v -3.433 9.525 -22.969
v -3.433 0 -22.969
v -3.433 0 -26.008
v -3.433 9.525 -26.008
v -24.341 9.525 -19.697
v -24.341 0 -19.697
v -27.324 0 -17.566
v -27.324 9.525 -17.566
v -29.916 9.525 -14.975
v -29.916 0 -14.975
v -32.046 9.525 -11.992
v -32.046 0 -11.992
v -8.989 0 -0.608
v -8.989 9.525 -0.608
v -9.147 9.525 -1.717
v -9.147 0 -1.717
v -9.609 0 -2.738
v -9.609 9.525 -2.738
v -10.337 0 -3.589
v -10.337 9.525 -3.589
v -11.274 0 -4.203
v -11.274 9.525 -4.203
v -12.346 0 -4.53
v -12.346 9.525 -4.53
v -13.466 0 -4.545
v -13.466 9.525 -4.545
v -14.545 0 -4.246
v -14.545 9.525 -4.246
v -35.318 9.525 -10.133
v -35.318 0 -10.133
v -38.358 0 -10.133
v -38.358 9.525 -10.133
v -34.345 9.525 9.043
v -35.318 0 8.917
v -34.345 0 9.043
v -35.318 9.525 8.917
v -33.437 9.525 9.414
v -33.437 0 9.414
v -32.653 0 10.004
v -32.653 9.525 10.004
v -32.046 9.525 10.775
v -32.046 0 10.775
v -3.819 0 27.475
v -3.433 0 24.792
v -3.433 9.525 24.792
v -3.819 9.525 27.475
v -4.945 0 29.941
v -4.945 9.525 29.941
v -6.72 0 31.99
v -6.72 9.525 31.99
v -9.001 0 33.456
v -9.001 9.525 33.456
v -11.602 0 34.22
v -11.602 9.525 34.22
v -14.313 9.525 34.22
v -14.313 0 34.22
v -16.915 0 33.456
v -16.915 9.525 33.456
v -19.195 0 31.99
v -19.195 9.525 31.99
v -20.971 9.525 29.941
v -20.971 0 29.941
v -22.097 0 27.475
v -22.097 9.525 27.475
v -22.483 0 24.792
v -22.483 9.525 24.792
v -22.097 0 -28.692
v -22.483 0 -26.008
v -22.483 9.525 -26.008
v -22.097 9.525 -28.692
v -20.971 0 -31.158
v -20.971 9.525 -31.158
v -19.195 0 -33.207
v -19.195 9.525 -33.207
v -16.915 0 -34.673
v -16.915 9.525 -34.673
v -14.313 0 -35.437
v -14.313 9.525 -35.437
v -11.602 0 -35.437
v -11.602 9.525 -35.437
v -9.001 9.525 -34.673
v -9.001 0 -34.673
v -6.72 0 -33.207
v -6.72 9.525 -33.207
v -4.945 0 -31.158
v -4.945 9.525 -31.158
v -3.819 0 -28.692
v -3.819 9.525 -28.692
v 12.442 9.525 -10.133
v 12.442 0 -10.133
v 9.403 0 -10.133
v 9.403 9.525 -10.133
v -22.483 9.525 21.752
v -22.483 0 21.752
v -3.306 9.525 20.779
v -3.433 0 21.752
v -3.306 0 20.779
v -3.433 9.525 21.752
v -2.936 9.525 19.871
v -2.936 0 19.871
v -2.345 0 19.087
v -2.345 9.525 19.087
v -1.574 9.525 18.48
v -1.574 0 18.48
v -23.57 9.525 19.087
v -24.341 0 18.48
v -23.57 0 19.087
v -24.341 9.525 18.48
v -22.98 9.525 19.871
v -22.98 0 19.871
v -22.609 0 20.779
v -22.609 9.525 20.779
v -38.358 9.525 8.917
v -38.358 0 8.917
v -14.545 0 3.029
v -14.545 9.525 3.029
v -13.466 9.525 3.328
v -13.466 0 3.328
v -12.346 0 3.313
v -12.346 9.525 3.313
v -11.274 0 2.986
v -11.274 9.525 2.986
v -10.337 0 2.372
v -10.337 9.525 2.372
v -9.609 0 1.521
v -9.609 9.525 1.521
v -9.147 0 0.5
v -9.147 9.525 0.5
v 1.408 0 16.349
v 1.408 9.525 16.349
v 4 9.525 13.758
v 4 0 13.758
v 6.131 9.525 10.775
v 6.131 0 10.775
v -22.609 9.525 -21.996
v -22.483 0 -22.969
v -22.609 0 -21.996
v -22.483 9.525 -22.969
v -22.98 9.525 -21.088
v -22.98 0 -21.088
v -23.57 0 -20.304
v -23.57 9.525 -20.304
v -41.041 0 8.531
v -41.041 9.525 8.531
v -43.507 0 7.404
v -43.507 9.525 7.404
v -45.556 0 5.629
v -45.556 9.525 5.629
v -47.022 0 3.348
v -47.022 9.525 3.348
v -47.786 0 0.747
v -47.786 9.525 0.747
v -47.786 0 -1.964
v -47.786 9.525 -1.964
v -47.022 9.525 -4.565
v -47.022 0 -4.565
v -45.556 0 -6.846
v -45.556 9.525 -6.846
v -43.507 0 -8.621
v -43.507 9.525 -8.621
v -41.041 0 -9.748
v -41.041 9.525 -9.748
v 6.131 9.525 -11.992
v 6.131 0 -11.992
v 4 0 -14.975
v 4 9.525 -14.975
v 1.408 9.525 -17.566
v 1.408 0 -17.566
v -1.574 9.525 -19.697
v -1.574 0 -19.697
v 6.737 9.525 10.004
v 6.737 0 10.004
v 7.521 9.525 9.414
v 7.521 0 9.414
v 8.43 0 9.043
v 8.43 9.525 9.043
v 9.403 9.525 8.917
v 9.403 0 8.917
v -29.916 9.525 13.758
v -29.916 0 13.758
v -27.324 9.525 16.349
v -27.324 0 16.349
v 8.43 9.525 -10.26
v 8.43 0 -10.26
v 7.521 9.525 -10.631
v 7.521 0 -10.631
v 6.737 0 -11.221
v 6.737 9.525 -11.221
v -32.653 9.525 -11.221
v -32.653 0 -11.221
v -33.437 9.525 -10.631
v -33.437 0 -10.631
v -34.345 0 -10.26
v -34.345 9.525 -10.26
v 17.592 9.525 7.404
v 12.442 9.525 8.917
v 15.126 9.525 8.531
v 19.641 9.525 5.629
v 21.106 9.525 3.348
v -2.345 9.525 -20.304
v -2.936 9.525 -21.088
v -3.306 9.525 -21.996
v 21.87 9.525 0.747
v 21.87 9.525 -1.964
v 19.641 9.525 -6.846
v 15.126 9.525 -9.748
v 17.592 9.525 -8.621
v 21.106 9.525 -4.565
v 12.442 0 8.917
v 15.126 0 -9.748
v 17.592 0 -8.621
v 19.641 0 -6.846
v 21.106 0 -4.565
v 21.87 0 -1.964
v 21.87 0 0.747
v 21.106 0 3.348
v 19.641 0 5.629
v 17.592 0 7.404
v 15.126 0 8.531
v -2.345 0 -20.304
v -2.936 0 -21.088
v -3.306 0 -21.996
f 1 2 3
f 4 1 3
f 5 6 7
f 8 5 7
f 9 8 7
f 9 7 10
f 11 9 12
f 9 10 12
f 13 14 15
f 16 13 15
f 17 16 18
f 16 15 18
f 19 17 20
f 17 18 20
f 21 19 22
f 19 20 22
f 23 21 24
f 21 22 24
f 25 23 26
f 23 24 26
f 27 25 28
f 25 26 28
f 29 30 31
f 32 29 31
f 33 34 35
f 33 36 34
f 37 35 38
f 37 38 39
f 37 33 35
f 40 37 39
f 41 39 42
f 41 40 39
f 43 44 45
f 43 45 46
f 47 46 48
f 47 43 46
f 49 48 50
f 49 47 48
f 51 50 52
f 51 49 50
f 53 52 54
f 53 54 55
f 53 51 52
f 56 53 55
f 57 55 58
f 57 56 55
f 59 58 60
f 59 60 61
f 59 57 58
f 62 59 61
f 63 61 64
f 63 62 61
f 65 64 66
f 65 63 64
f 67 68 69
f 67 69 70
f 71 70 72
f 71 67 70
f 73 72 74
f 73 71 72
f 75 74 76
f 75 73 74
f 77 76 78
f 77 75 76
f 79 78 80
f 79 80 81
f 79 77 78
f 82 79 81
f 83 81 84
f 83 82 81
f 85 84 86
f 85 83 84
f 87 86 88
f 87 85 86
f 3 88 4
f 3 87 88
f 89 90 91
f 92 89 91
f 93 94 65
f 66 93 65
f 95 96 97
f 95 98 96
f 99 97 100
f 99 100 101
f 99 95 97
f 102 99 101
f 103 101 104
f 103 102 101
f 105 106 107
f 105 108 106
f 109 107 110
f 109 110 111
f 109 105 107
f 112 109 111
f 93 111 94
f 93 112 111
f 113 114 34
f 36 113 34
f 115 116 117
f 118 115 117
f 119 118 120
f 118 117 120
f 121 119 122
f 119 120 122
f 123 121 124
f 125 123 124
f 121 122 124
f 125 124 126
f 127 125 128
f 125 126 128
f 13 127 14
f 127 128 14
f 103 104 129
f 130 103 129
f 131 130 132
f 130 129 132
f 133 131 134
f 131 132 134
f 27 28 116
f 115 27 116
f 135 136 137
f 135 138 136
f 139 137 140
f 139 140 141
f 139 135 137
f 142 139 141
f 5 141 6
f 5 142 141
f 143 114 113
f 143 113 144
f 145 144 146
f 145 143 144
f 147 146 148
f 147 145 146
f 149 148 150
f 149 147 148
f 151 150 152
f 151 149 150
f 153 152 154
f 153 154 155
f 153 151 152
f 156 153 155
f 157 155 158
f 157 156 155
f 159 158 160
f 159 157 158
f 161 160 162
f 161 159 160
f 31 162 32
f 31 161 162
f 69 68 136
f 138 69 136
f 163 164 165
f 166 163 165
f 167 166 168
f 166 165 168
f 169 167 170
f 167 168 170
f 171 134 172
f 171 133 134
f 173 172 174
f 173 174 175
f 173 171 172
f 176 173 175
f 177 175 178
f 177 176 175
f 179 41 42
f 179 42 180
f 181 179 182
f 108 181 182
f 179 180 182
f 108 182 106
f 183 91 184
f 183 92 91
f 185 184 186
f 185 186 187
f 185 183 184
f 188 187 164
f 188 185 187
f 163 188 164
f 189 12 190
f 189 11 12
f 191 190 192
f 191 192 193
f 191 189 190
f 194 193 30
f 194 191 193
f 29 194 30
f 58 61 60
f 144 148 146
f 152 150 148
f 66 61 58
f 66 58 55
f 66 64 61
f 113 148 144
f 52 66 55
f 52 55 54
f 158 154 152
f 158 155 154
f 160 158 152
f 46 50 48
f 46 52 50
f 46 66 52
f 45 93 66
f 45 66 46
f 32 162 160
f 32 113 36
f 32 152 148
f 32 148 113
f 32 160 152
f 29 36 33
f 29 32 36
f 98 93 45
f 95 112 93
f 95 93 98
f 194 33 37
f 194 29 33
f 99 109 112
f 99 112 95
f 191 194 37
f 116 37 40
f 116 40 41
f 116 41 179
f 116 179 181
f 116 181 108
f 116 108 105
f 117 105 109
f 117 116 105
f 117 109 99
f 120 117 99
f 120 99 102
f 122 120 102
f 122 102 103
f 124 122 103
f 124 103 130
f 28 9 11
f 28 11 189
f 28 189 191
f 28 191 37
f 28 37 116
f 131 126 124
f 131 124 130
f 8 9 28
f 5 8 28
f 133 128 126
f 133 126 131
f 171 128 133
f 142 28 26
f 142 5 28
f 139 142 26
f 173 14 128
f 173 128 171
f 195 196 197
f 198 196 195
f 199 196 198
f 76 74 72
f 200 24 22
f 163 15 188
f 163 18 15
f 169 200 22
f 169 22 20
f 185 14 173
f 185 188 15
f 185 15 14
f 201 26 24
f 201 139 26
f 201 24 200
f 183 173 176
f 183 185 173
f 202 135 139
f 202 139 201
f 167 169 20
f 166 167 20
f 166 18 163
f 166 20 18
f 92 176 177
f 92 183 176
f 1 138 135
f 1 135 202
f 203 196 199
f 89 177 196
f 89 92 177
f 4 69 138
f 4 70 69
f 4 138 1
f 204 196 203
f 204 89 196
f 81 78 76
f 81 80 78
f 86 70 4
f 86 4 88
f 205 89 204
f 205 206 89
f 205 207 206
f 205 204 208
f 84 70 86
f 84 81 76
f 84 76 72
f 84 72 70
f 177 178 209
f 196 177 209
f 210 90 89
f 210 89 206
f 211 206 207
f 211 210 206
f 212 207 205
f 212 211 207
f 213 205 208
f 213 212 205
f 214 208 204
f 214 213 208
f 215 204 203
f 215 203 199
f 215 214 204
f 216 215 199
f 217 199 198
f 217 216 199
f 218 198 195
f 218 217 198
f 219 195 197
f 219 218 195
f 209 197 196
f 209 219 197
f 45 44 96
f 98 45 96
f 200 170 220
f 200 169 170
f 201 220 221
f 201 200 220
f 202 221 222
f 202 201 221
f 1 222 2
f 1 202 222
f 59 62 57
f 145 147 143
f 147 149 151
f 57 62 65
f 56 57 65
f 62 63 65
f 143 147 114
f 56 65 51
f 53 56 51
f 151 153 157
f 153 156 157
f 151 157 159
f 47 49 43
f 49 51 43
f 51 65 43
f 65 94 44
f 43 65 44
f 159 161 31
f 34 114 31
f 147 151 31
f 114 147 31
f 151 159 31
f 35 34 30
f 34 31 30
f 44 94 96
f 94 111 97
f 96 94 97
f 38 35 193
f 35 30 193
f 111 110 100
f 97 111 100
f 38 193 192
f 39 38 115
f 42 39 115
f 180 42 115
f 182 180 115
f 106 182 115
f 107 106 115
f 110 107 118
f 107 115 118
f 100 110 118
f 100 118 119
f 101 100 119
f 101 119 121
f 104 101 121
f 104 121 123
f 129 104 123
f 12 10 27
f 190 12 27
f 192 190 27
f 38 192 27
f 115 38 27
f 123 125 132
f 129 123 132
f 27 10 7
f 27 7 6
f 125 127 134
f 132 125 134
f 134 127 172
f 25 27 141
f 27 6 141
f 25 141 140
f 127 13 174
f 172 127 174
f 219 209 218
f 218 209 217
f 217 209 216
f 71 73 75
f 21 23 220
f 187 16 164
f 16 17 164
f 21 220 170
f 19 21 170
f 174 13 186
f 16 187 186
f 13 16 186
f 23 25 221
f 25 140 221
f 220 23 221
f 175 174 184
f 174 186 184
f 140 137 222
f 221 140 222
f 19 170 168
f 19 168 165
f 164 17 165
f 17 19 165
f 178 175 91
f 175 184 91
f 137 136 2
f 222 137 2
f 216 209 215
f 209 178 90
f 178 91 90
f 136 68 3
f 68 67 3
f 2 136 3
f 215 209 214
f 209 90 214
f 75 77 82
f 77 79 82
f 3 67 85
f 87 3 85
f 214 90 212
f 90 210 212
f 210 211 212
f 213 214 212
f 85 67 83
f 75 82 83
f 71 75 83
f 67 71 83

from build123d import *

# Parameters (mm, degrees)
SKETCH1_W           = 19.05
SKETCH1_H           = 19.05
BOSS_EXTRUDE1_DEPTH = 9.525
FILLET1_R           = 3.81
CUT_EXTRUDE1_DEPTH  = 61.38309394


with BuildPart() as part:
    # Sketch1 → Boss-Extrude1 (new body)
    with BuildSketch(Plane(origin=(0, 0, 0), x_dir=(1, 0, 0), z_dir=(0, 1, 0))):
        with BuildLine():
            Line((-3.432814358, 26.008484179), (-22.482814358, 26.008484179))
            Line((-22.482814358, 26.008484179), (-22.482814358, 20.688947321))
            ThreePointArc((-22.482814358, 20.688947321), (-12.957814358, 22.833484179), (-3.432814358, 20.688947321))
            Line((-3.432814358, 20.688947321), (-3.432814358, 26.008484179))
        make_face()
        with BuildLine():
            ThreePointArc((-3.432814358, 20.688947321), (-12.957814358, 22.833484179), (-22.482814358, 20.688947321))
            Line((-22.482814358, 20.688947321), (-22.482814358, 10.133484179))
            Line((-22.482814358, 10.133484179), (-3.432814358, 10.133484179))
            Line((-3.432814358, 10.133484179), (-3.432814358, 20.688947321))
        make_face()
        with BuildLine():
            ThreePointArc((-22.482814358, 26.008484179), (-12.957814358, 35.533484179), (-3.432814358, 26.008484179))
            Line((-3.432814358, 26.008484179), (-22.482814358, 26.008484179))
        make_face()
        with Locations((-12.957814358, 0.608484179)):
            Rectangle(SKETCH1_W, SKETCH1_H)
        with BuildLine():
            Line((-22.482814358, -8.916515821), (-22.482814358, 10.133484179))
            Line((-22.482814358, 10.133484179), (-33.0382775, 10.133484179))
            ThreePointArc((-33.0382775, 10.133484179), (-35.182814358, 0.608484179), (-33.0382775, -8.916515821))
            Line((-33.0382775, -8.916515821), (-22.482814358, -8.916515821))
        make_face()
        with BuildLine():
            ThreePointArc((-33.0382775, -8.916515821), (-35.182814358, 0.608484179), (-33.0382775, 10.133484179))
            Line((-33.0382775, 10.133484179), (-38.357814358, 10.133484179))
            Line((-38.357814358, 10.133484179), (-38.357814358, -8.916515821))
            Line((-38.357814358, -8.916515821), (-33.0382775, -8.916515821))
        make_face()
        with BuildLine():
            Line((-38.357814358, 10.133484179), (-38.357814358, -8.916515821))
            ThreePointArc((-38.357814358, -8.916515821), (-47.882814358, 0.608484179), (-38.357814358, 10.133484179))
        make_face()
        with BuildLine():
            Line((-22.482814358, -19.471978963), (-22.482814358, -8.916515821))
            Line((-22.482814358, -8.916515821), (-33.0382775, -8.916515821))
            ThreePointArc((-33.0382775, -8.916515821), (-28.67326257, -15.106964033), (-22.482814358, -19.471978963))
        make_face()
        with BuildLine():
            Line((-3.432814358, -8.916515821), (-22.482814358, -8.916515821))
            Line((-22.482814358, -8.916515821), (-22.482814358, -19.471978963))
            ThreePointArc((-22.482814358, -19.471978963), (-12.957814358, -21.616515821), (-3.432814358, -19.471978963))
            Line((-3.432814358, -19.471978963), (-3.432814358, -8.916515821))
        make_face()
        with BuildLine():
            ThreePointArc((-3.432814358, -19.471978963), (-12.957814358, -21.616515821), (-22.482814358, -19.471978963))
            Line((-22.482814358, -19.471978963), (-22.482814358, -24.791515821))
            Line((-22.482814358, -24.791515821), (-3.432814358, -24.791515821))
            Line((-3.432814358, -24.791515821), (-3.432814358, -19.471978963))
        make_face()
        with BuildLine():
            ThreePointArc((-3.432814358, -24.791515821), (-12.957814358, -34.316515821), (-22.482814358, -24.791515821))
            Line((-22.482814358, -24.791515821), (-3.432814358, -24.791515821))
        make_face()
        with BuildLine():
            ThreePointArc((7.122648784, 10.133484179), (2.757633854, 16.323932391), (-3.432814358, 20.688947321))
            Line((-3.432814358, 20.688947321), (-3.432814358, 10.133484179))
            Line((-3.432814358, 10.133484179), (7.122648784, 10.133484179))
        make_face()
        with BuildLine():
            Line((7.122648784, 10.133484179), (-3.432814358, 10.133484179))
            Line((-3.432814358, 10.133484179), (-3.432814358, -8.916515821))
            Line((-3.432814358, -8.916515821), (7.122648784, -8.916515821))
            ThreePointArc((7.122648784, -8.916515821), (8.724423976, -4.273233329), (9.267185642, 0.608484179))
            ThreePointArc((9.267185642, 0.608484179), (8.724423976, 5.490201688), (7.122648784, 10.133484179))
        make_face()
        with BuildLine():
            Line((7.122648784, -8.916515821), (-3.432814358, -8.916515821))
            Line((-3.432814358, -8.916515821), (-3.432814358, -19.471978963))
            ThreePointArc((-3.432814358, -19.471978963), (2.757633854, -15.106964033), (7.122648784, -8.916515821))
        make_face()
        with BuildLine():
            Line((12.442185642, 10.133484179), (7.122648784, 10.133484179))
            ThreePointArc((7.122648784, 10.133484179), (8.724423976, 5.490201688), (9.267185642, 0.608484179))
            ThreePointArc((9.267185642, 0.608484179), (8.724423976, -4.273233329), (7.122648784, -8.916515821))
            Line((7.122648784, -8.916515821), (12.442185642, -8.916515821))
            Line((12.442185642, -8.916515821), (12.442185642, 10.133484179))
        make_face()
        with BuildLine():
            ThreePointArc((12.442185642, 10.133484179), (21.967185642, 0.608484179), (12.442185642, -8.916515821))
            Line((12.442185642, -8.916515821), (12.442185642, 10.133484179))
        make_face()
        with BuildLine():
            Line((-22.482814358, 10.133484179), (-22.482814358, 20.688947321))
            ThreePointArc((-22.482814358, 20.688947321), (-28.67326257, 16.323932391), (-33.0382775, 10.133484179))
            Line((-33.0382775, 10.133484179), (-22.482814358, 10.133484179))
        make_face()
    extrude(amount=BOSS_EXTRUDE1_DEPTH)

    # Fillet1
    fillet1_edges = [part.edges().sort_by_distance(p)[0] for p in [
        (-22.482814358, 4.7625, -20.688947321),
        (-3.432814358, 4.7625, -20.688947321),
        (7.122648784, 4.7625, -10.133484179),
        (7.122648784, 4.7625, 8.916515821),
        (-3.432814358, 4.7625, 19.471978963),
        (-22.482814358, 4.7625, 19.471978963),
        (-33.0382775, 4.7625, 8.916515821),
        (-33.0382775, 4.7625, -10.133484179),
    ]]
    fillet(fillet1_edges, radius=FILLET1_R)

    # Sketch2 → Cut-Extrude1 (cut, through all)
    with BuildSketch(Plane(origin=(0, 9.525, 0), x_dir=(1, 0, 0), z_dir=(0, 1, 0))):
        with BuildLine():
            ThreePointArc((-8.989064358, 0.608484179), (-10.784040458, 3.92897866), (-14.545314358, 4.245903637))
            Line((-14.545314358, 4.245903637), (-14.545314358, 0.608484179))
            Line((-14.545314358, 0.608484179), (-8.989064358, 0.608484179))
        make_face()
        with BuildLine():
            Line((-8.989064358, 0.608484179), (-14.545314358, 0.608484179))
            Line((-14.545314358, 0.608484179), (-14.545314358, -3.028935279))
            ThreePointArc((-14.545314358, -3.028935279), (-10.784040458, -2.712010301), (-8.989064358, 0.608484179))
        make_face()
    extrude(amount=-CUT_EXTRUDE1_DEPTH, mode=Mode.SUBTRACT)


solid = part.part
